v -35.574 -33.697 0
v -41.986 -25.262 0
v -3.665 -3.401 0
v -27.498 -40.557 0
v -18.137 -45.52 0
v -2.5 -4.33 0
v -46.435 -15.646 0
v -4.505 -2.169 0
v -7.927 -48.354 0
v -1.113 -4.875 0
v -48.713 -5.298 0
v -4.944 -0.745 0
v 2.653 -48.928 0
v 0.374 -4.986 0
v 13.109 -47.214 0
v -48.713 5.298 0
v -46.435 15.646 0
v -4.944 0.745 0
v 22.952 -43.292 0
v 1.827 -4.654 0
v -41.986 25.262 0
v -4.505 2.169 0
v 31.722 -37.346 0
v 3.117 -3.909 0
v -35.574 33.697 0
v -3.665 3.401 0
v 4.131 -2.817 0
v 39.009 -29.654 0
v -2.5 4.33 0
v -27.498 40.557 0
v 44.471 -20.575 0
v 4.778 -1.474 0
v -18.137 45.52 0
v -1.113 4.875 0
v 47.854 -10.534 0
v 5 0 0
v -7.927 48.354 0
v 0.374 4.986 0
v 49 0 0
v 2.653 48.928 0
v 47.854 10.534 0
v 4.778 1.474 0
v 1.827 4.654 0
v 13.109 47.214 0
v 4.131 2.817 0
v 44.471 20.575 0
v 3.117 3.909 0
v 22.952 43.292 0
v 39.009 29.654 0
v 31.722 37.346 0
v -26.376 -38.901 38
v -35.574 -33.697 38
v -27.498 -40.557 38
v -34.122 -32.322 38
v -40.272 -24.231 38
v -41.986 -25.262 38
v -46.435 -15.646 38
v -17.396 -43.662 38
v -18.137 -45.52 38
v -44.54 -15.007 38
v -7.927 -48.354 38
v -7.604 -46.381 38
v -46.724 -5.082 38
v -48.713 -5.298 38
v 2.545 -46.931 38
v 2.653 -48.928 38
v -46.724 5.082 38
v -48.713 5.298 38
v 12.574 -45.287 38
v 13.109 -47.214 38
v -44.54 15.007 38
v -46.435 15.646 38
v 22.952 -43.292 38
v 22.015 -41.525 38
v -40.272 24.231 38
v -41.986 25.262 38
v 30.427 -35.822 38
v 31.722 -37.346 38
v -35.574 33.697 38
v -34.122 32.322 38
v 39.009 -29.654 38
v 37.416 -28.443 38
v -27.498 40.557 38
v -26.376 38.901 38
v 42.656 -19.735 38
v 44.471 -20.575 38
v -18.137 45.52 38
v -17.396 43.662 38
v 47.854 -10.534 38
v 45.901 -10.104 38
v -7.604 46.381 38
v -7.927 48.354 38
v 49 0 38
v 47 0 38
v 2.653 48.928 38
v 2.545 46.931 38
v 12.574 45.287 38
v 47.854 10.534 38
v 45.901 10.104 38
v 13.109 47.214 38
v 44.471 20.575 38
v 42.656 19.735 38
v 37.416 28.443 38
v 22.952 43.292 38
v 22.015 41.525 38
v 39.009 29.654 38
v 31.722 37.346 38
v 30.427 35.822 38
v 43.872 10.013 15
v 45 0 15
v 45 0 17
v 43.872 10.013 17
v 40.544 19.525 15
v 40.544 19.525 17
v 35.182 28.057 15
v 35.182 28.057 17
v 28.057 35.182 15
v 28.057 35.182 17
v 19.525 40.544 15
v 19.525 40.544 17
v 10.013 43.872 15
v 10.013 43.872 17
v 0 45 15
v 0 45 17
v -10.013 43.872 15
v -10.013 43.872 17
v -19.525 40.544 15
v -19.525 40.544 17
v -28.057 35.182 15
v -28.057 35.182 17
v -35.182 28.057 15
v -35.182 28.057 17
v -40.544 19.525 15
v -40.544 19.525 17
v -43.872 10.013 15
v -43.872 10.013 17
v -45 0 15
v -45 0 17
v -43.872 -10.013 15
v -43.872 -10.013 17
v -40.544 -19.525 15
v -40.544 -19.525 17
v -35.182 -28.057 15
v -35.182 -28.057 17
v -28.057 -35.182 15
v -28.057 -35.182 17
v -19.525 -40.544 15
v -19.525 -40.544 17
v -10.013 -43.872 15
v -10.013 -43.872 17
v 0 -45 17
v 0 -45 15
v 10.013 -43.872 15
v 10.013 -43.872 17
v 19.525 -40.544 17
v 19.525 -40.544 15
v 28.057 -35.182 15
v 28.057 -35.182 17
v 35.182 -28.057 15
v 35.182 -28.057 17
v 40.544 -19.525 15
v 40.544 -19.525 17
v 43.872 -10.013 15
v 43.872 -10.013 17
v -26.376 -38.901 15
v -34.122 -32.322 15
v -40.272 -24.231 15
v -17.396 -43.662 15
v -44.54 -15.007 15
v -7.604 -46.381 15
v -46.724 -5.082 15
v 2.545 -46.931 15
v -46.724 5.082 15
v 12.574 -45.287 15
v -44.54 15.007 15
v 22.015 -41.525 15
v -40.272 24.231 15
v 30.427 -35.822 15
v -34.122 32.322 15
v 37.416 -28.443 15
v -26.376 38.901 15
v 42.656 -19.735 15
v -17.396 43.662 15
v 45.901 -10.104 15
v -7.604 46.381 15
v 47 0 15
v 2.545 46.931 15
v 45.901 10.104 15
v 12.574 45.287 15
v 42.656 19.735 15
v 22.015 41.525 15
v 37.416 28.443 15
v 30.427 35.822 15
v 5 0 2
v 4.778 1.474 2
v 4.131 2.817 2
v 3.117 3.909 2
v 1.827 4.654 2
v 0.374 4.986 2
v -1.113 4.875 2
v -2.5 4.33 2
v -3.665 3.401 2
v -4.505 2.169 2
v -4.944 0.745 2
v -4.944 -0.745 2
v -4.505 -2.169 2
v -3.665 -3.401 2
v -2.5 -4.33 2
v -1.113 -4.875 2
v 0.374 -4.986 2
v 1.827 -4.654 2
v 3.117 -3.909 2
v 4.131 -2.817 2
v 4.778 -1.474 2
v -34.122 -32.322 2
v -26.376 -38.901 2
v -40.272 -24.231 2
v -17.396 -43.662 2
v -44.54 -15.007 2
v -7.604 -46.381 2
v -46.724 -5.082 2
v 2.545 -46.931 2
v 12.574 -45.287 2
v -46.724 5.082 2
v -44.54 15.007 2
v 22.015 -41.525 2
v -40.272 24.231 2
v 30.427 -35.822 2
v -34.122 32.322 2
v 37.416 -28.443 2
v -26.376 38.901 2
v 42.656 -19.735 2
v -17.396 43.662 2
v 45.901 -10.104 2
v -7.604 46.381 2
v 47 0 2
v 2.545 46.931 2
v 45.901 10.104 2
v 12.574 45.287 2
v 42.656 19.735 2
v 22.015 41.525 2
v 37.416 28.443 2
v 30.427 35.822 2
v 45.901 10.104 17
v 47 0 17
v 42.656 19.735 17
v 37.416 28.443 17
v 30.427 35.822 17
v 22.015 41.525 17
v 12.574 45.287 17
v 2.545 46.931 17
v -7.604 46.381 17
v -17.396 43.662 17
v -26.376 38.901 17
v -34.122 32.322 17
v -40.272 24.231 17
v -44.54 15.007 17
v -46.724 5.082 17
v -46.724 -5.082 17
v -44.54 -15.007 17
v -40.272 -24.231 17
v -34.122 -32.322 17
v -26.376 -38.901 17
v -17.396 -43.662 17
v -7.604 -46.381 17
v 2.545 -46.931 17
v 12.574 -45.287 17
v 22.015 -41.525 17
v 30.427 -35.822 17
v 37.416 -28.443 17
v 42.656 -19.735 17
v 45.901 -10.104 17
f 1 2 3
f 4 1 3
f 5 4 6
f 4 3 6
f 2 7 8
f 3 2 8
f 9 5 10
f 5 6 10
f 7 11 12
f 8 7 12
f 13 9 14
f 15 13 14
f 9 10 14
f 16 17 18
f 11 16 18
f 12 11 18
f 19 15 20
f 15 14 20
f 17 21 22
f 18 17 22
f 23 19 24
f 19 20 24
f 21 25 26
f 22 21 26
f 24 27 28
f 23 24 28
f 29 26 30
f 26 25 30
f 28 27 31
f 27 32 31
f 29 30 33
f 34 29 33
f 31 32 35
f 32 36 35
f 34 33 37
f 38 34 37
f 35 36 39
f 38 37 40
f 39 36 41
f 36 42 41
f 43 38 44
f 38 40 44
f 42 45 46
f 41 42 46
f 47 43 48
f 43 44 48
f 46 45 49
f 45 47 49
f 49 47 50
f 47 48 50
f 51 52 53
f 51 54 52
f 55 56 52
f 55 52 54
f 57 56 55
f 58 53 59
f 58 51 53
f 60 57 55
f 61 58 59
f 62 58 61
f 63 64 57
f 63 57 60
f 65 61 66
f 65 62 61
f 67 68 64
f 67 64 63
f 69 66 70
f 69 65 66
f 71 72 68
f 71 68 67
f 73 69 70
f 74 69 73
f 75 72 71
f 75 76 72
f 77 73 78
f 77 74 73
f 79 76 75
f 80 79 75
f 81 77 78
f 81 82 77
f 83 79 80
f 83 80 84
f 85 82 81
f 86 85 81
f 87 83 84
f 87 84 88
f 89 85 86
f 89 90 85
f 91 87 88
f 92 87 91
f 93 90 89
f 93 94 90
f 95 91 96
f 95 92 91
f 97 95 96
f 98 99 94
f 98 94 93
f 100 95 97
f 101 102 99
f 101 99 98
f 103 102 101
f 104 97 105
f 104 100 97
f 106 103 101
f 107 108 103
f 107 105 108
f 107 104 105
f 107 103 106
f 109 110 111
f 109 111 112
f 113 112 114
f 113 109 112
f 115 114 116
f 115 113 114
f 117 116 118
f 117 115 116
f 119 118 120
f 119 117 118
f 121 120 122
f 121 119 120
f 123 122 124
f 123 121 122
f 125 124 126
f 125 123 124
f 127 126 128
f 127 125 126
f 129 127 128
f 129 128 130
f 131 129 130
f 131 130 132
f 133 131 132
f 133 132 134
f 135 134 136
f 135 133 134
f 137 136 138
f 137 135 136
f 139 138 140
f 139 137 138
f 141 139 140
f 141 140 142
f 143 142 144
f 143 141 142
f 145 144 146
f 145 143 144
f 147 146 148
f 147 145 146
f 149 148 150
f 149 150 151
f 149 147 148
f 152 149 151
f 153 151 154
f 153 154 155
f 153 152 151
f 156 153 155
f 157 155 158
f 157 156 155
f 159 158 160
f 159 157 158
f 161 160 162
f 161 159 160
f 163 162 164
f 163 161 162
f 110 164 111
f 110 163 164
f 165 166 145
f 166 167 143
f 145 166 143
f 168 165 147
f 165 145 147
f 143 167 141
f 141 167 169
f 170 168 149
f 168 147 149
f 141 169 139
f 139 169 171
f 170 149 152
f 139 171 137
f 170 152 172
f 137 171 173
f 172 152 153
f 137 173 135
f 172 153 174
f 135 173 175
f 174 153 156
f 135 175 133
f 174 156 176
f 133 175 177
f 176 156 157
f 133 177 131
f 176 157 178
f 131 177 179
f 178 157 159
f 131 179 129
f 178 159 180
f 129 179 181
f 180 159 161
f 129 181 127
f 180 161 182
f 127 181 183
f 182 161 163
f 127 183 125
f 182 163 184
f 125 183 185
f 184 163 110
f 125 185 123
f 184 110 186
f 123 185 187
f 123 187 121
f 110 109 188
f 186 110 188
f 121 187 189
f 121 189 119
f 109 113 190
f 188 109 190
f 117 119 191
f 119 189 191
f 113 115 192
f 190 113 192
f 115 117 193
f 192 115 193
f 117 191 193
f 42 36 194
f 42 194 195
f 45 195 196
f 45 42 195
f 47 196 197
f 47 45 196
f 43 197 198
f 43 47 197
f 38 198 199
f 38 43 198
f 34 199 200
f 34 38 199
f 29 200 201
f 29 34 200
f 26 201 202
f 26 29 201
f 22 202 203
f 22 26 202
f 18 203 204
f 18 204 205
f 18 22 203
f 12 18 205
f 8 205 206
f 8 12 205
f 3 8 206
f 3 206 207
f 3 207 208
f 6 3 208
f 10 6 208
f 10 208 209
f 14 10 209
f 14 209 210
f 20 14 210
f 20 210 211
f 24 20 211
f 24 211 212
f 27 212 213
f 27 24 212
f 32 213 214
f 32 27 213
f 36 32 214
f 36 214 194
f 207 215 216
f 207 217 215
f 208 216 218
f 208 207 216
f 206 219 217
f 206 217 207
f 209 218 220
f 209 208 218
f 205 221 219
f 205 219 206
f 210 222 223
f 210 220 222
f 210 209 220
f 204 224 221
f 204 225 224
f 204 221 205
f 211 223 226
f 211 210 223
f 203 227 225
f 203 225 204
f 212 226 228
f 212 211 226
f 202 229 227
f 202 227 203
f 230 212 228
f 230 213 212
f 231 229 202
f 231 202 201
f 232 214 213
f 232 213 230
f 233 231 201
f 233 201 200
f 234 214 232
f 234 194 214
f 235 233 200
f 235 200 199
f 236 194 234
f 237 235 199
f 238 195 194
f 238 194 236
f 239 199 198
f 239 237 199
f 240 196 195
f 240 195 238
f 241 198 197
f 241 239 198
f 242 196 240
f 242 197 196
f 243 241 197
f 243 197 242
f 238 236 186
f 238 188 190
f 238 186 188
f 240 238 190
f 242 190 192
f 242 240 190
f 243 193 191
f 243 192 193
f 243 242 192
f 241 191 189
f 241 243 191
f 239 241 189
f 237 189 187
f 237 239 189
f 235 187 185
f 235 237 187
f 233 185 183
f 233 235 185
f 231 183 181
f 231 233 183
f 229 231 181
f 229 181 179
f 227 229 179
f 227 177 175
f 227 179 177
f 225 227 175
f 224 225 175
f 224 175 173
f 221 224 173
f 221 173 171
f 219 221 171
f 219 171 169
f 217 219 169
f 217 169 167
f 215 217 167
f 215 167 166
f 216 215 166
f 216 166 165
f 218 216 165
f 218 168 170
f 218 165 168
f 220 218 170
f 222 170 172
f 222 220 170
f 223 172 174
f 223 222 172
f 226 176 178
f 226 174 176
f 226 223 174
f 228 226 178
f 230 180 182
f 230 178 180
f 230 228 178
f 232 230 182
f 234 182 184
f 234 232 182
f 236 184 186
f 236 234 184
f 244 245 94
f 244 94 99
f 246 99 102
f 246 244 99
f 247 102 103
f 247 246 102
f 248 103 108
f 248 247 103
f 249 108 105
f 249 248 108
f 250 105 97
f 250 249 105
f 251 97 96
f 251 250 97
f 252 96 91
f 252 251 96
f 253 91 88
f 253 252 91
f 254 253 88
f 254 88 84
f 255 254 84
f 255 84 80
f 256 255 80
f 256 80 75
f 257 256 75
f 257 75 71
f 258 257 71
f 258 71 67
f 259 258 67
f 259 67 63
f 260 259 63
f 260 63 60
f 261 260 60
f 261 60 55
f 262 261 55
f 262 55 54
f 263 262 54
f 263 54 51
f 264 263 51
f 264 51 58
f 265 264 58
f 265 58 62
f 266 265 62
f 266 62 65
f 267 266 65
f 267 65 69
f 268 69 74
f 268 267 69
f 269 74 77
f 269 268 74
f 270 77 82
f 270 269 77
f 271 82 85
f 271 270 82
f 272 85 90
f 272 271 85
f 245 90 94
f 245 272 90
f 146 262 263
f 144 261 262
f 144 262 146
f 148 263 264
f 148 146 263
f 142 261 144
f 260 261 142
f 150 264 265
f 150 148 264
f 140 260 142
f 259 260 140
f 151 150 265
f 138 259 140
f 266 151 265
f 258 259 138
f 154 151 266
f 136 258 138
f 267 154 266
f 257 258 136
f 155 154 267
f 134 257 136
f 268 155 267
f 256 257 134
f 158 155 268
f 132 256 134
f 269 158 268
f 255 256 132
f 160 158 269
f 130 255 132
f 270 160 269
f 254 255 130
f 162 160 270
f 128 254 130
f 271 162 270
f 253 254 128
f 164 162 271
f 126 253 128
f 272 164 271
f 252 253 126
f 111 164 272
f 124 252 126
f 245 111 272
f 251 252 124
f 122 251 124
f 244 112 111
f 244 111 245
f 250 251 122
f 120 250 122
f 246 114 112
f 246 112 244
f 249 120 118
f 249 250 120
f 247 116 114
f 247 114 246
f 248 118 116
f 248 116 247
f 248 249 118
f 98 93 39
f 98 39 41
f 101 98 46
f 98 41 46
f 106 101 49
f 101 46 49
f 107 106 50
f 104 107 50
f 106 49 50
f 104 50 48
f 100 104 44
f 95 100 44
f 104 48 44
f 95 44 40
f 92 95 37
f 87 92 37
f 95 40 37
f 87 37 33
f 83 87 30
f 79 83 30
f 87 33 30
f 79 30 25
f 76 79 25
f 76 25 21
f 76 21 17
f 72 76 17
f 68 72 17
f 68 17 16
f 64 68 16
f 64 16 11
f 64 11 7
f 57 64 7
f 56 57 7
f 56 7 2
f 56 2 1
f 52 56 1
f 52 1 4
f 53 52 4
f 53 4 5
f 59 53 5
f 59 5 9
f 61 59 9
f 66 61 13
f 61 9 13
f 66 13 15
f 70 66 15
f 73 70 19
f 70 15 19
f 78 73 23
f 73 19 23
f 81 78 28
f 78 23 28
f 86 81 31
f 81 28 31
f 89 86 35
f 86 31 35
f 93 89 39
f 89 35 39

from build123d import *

# Parameters (mm, degrees)
CROQUIS1_R              = 49
CROQUIS1_R_2            = 47
SALIENTE_EXTRUIR1_DEPTH = 38
CROQUIS2_R              = 49
CROQUIS2_R_2            = 5
SALIENTE_EXTRUIR3_DEPTH = 2
SALIENTE_EXTRUIR4_START = 15
CROQUIS3_R              = 49
CROQUIS3_R_2            = 45
SALIENTE_EXTRUIR4_DEPTH = 2


with BuildPart() as part:
    # Croquis1 → Saliente-Extruir1 (new body)
    with BuildSketch(Plane.XY):
        Circle(CROQUIS1_R)
        Circle(CROQUIS1_R_2, mode=Mode.SUBTRACT)
    extrude(amount=SALIENTE_EXTRUIR1_DEPTH)

    # Croquis2 → Saliente-Extruir3 (add)
    with BuildSketch(Plane.XY):
        Circle(CROQUIS2_R)
        Circle(CROQUIS2_R_2, mode=Mode.SUBTRACT)
    extrude(amount=SALIENTE_EXTRUIR3_DEPTH)

    # Croquis3 → Saliente-Extruir4 (add)
    with BuildSketch(Plane.XY.offset(SALIENTE_EXTRUIR4_START)):
        Circle(CROQUIS3_R)
        Circle(CROQUIS3_R_2, mode=Mode.SUBTRACT)
    extrude(amount=SALIENTE_EXTRUIR4_DEPTH)


solid = part.part
